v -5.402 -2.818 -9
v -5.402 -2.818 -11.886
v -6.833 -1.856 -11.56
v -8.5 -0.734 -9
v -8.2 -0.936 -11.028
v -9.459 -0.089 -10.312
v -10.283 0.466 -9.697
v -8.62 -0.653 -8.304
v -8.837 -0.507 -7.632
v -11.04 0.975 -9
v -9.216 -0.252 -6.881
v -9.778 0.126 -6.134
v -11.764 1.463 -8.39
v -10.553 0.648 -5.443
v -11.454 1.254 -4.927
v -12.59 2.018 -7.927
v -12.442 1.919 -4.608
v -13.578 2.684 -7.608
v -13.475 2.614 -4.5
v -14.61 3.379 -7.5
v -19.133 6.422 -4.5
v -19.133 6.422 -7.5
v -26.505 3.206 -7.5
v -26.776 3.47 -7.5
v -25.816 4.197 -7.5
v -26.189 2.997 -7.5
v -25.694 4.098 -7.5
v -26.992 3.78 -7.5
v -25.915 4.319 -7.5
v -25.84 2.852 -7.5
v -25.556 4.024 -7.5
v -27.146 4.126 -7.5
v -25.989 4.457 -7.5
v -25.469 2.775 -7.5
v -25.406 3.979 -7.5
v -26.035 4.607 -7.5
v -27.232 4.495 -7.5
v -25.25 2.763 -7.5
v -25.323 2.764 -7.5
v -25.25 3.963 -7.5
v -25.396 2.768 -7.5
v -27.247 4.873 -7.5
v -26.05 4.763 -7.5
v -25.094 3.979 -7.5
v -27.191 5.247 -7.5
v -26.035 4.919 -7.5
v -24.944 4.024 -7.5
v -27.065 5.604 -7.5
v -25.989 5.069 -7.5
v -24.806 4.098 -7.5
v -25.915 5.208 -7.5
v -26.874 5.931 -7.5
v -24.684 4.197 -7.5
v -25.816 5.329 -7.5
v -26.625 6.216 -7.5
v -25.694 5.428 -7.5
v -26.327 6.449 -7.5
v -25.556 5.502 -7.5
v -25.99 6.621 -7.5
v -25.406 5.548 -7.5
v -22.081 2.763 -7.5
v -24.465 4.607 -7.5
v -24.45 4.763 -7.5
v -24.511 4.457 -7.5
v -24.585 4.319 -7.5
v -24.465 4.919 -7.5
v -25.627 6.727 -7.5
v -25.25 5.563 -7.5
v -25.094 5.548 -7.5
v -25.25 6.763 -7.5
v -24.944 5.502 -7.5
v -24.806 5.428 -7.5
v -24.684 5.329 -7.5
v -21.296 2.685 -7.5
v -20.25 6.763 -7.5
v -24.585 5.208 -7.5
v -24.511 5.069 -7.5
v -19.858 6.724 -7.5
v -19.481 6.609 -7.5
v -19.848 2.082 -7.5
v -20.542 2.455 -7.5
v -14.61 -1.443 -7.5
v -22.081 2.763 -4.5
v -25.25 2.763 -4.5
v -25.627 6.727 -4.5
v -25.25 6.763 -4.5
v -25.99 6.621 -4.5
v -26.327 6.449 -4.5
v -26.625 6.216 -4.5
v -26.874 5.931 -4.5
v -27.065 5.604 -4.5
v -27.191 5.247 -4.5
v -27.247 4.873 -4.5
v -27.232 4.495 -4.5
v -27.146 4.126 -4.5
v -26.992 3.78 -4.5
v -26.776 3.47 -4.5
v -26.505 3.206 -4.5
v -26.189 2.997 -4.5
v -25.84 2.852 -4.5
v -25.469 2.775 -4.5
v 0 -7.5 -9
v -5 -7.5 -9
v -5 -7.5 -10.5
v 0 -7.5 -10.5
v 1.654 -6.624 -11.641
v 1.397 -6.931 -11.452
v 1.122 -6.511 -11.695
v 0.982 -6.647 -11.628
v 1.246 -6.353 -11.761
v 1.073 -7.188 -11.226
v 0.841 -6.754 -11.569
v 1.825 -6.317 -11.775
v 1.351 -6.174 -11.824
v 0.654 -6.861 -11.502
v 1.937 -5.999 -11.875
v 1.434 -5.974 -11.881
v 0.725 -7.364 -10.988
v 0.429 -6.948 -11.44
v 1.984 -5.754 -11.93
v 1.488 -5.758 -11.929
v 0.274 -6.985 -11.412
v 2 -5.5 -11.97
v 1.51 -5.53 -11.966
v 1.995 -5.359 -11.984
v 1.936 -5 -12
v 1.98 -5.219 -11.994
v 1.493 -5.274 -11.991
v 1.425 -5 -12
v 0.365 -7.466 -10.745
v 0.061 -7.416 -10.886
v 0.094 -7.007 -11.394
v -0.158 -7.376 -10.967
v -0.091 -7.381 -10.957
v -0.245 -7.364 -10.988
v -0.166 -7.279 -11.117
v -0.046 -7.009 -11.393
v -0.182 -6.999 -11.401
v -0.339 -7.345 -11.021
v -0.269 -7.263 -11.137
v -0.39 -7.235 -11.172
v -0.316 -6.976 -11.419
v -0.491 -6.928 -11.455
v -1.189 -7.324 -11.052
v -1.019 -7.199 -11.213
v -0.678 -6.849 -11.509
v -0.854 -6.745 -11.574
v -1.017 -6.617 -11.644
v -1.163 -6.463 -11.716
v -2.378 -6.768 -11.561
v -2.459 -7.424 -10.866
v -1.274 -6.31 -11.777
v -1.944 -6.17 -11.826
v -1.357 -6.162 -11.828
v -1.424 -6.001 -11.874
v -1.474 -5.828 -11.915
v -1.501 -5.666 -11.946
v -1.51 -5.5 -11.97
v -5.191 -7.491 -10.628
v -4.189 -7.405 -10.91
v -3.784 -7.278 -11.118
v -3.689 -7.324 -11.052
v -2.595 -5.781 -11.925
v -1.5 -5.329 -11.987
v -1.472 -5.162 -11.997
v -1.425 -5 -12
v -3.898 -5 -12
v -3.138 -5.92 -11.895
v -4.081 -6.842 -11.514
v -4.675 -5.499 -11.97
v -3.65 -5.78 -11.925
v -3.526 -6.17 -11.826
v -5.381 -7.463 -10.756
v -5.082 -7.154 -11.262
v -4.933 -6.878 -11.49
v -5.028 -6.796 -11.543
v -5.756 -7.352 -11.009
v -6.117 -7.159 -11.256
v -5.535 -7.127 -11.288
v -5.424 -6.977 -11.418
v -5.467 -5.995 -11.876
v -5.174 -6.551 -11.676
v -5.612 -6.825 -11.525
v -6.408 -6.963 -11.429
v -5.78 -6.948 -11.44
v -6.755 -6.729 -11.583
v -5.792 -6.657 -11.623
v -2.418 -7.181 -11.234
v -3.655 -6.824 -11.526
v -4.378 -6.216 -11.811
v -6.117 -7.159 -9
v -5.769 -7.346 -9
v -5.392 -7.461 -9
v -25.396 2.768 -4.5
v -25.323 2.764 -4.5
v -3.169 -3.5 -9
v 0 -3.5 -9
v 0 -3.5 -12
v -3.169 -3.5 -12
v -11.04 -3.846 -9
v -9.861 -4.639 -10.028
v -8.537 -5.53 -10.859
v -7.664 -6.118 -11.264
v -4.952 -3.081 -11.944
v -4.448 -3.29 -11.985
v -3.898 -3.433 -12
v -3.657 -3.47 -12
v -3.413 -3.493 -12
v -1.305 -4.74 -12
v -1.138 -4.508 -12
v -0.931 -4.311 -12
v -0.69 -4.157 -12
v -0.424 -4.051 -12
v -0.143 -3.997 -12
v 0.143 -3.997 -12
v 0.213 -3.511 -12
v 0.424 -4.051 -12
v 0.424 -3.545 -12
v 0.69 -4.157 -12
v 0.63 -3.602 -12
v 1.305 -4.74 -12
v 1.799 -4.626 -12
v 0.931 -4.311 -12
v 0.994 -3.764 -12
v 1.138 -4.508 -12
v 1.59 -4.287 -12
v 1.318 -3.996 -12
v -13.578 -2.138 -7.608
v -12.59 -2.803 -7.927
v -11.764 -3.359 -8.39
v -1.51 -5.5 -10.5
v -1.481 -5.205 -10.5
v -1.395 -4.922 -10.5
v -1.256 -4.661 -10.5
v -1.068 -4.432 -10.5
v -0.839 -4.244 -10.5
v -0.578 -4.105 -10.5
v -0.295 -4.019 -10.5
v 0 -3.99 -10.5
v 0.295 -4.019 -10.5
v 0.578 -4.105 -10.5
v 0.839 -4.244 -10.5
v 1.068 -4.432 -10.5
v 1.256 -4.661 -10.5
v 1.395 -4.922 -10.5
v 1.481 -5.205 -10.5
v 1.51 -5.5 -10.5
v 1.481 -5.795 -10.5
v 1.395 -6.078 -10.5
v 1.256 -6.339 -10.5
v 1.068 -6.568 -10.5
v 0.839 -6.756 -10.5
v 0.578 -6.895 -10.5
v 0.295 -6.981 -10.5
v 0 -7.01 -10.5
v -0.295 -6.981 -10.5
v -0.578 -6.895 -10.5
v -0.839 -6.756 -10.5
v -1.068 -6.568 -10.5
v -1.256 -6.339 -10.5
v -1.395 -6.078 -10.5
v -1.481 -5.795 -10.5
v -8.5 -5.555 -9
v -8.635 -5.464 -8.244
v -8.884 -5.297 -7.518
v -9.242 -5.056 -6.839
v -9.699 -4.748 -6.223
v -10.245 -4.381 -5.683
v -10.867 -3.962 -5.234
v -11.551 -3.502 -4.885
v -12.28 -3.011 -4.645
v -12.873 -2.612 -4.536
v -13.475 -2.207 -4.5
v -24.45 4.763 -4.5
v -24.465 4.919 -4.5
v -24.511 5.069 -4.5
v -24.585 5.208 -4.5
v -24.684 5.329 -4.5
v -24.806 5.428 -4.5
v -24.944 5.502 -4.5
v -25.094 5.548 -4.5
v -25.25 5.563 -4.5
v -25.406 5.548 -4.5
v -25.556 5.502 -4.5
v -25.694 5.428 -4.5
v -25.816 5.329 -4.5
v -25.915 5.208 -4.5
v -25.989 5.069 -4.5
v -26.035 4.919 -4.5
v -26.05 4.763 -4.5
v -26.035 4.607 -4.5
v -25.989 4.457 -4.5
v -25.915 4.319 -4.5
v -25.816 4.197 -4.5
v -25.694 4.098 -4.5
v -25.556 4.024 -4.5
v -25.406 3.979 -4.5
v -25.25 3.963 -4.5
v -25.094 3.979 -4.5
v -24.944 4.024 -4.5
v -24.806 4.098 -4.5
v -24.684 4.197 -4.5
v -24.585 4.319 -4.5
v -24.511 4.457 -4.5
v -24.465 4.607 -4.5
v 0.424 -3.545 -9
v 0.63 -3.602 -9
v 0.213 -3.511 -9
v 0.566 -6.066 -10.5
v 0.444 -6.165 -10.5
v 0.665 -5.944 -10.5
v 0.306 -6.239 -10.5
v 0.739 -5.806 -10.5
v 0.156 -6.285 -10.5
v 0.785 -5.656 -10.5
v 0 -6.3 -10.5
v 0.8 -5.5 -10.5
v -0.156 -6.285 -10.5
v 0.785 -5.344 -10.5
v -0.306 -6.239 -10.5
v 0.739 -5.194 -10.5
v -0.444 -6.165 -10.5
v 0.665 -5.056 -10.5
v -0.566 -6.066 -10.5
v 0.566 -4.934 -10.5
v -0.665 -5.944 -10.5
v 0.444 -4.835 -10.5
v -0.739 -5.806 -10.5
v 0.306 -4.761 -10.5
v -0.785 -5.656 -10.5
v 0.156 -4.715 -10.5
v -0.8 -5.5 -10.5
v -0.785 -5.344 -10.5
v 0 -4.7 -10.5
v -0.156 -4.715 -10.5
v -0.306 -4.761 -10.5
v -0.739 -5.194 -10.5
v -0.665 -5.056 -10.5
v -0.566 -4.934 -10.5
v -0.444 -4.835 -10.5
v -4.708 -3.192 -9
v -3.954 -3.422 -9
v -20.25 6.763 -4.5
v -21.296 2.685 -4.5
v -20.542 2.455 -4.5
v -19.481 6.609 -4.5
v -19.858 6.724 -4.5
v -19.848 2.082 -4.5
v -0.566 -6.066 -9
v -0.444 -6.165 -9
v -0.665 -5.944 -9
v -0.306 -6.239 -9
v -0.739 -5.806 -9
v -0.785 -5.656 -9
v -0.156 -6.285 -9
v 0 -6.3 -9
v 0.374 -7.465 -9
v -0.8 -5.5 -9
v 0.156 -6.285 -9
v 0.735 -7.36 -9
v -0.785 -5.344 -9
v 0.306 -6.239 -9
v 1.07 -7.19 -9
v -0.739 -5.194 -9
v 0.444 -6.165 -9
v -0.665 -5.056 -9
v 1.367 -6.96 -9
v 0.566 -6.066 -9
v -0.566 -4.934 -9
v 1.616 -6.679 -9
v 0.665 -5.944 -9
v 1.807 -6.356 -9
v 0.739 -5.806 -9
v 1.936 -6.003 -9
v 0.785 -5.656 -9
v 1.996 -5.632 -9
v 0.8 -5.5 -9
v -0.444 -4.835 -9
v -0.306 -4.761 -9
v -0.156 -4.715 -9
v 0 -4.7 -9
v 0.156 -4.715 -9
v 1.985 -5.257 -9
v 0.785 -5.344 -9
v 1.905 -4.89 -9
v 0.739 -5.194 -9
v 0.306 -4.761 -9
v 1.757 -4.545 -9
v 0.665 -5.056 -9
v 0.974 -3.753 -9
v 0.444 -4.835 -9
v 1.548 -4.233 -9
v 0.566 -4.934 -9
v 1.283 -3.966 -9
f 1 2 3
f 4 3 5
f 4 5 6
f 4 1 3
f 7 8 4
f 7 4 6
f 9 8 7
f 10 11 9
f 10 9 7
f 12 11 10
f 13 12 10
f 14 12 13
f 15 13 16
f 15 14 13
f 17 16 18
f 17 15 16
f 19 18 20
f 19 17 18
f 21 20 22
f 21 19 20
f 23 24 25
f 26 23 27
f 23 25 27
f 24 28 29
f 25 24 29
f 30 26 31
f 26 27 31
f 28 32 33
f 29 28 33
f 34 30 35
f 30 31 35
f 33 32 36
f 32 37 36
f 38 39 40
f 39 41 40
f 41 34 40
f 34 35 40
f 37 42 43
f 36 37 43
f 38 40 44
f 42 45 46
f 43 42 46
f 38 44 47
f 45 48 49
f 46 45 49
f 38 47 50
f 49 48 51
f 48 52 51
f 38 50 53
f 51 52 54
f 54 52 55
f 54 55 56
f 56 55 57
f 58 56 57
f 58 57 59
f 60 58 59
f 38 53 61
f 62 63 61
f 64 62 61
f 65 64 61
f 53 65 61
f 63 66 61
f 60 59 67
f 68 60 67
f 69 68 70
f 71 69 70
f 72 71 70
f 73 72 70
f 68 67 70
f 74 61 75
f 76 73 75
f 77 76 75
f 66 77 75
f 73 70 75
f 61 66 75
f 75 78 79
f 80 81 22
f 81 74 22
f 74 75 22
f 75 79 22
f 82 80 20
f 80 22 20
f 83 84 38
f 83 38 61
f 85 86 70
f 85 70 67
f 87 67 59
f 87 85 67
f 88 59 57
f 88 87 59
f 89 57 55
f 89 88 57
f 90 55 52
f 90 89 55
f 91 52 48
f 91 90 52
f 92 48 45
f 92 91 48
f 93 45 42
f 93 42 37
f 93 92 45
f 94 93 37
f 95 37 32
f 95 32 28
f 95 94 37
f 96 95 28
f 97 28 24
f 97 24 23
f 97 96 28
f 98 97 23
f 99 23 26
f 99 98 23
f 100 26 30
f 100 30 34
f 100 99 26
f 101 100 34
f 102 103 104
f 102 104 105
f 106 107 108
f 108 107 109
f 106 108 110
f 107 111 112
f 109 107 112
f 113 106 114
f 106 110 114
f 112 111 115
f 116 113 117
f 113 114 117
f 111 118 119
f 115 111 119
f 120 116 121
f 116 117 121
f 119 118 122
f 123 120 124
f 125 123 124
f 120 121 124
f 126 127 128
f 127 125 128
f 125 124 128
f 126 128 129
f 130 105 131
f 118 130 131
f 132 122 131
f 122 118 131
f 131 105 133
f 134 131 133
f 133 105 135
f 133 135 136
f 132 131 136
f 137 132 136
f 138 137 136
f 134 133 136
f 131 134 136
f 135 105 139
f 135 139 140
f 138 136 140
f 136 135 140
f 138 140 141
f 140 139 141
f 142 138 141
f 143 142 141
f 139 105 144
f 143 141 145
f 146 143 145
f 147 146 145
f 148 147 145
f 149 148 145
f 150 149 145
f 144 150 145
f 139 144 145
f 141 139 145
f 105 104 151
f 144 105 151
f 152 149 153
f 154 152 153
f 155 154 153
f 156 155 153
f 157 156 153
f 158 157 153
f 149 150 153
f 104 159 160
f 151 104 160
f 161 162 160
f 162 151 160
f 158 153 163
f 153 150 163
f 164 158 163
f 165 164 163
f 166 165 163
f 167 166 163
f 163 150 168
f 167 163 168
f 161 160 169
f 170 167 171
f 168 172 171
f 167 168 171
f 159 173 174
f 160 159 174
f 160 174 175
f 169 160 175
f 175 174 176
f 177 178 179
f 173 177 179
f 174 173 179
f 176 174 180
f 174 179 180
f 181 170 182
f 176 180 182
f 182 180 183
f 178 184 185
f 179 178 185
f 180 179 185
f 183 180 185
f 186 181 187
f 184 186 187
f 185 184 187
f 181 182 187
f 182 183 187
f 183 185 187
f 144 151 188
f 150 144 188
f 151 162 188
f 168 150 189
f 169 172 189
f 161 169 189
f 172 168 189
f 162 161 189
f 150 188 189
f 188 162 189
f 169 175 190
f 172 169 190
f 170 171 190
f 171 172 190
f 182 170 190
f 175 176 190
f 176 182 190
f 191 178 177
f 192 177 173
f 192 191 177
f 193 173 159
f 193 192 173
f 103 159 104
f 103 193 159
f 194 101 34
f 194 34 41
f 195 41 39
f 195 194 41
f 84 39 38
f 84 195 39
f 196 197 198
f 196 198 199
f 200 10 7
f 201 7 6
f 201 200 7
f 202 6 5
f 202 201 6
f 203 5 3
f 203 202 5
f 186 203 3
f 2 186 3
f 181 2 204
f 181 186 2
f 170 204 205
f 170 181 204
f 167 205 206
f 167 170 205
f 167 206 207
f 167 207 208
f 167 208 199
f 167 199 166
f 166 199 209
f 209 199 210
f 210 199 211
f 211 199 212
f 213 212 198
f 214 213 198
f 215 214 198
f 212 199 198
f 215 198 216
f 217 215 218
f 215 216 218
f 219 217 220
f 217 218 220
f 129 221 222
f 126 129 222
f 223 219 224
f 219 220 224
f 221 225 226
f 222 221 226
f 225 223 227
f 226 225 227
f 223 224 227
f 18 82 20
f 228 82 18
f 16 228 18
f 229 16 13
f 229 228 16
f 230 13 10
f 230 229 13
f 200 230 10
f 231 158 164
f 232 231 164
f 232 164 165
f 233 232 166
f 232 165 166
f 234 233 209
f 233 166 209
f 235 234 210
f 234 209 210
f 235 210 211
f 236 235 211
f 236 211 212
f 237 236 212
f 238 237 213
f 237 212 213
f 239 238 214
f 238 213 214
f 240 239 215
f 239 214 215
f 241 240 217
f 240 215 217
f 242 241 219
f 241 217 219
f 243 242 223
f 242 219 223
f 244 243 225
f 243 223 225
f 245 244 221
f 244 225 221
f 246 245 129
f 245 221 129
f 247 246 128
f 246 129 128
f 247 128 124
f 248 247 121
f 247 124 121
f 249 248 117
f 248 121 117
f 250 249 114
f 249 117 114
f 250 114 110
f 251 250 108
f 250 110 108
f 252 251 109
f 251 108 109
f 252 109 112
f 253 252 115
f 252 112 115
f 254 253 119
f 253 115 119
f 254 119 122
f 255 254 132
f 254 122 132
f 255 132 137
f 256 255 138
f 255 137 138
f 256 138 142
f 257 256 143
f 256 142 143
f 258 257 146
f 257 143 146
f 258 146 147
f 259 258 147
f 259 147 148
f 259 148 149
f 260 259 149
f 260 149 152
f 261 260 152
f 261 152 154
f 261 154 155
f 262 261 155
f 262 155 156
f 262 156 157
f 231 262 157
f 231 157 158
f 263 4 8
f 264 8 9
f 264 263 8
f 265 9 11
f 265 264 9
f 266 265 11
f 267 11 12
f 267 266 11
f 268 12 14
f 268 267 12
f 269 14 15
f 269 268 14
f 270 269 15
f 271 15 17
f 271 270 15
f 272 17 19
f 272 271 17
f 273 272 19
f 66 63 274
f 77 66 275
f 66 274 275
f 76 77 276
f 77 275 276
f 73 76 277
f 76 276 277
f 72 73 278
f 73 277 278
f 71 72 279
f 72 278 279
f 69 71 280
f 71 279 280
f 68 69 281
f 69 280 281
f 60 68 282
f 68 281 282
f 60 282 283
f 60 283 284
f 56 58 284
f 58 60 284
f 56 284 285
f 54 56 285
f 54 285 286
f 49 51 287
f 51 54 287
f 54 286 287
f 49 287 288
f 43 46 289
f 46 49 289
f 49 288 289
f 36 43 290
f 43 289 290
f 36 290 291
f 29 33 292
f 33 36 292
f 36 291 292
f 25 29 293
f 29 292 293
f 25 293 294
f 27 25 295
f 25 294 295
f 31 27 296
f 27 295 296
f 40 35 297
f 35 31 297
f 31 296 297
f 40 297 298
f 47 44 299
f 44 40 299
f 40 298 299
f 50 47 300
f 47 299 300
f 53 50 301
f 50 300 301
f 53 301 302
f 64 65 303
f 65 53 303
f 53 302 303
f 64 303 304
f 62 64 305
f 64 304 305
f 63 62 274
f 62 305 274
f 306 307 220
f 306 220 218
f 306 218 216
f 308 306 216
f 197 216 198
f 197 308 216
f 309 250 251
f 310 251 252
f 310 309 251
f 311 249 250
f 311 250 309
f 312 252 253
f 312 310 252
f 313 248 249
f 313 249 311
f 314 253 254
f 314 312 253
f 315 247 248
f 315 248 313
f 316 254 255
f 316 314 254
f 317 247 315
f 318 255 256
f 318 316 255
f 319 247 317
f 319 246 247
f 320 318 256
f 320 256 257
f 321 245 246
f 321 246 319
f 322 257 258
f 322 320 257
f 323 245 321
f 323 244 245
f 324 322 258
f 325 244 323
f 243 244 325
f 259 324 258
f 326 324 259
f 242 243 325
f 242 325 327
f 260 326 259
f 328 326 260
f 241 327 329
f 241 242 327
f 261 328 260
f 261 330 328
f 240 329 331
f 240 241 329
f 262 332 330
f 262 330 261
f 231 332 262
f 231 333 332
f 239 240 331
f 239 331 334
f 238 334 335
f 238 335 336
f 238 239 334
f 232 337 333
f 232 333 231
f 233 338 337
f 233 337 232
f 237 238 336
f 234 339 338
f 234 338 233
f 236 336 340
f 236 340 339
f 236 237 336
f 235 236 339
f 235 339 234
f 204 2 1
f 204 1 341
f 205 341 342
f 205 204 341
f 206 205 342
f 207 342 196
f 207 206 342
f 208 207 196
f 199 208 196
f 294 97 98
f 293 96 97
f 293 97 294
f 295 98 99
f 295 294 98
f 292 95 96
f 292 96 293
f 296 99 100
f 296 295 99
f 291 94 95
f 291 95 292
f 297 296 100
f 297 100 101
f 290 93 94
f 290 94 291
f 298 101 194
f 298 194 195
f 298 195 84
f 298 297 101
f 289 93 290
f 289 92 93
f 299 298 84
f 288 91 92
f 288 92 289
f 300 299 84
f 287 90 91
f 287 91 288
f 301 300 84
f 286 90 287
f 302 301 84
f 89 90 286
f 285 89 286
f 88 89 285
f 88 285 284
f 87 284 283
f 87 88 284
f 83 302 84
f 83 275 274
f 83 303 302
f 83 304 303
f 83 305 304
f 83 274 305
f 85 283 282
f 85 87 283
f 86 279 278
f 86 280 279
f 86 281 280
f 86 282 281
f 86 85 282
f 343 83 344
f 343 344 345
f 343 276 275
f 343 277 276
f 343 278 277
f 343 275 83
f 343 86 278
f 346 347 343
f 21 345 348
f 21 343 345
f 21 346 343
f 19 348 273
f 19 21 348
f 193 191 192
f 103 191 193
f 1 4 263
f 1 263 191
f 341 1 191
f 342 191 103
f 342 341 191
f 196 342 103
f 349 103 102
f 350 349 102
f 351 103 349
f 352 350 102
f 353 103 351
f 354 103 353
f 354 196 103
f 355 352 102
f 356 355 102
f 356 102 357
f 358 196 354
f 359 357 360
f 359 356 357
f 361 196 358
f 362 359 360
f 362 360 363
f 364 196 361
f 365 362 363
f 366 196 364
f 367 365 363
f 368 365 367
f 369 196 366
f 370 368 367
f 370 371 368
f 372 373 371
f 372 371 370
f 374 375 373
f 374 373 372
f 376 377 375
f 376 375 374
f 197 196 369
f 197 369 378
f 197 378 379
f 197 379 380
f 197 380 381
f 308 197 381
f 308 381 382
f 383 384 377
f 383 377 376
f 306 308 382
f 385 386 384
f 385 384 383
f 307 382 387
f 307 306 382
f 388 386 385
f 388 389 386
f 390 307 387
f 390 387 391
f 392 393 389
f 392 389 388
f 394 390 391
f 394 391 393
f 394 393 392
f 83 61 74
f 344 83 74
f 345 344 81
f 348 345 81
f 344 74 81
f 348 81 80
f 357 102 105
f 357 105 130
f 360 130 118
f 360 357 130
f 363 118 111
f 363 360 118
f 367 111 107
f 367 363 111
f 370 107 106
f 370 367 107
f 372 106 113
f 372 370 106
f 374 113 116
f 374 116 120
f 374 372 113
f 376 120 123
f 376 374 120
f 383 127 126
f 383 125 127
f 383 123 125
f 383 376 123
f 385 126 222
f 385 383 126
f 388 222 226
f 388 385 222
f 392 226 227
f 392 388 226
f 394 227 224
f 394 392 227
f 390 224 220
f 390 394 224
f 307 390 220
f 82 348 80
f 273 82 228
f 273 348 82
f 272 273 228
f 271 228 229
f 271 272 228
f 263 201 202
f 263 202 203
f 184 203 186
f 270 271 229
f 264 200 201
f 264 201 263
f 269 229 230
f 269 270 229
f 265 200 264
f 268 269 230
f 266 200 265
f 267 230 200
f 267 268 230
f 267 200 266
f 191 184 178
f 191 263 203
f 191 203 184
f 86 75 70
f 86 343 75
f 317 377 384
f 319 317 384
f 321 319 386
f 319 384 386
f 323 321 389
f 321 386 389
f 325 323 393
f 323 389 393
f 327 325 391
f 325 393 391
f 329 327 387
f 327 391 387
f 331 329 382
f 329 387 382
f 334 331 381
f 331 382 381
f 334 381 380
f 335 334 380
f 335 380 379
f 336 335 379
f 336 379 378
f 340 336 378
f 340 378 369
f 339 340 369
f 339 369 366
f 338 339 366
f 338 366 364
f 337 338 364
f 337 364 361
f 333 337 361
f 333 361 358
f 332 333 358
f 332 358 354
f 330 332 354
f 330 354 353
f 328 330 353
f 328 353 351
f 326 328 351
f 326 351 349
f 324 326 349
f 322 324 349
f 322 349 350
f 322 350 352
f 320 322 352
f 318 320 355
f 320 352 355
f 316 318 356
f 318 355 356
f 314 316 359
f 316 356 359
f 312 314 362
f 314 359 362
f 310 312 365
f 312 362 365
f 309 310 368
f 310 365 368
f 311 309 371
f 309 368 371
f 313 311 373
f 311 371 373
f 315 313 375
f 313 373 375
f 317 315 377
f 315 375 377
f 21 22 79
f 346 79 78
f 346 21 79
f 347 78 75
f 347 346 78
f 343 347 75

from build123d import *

# Parameters (mm, degrees)
BOSS_EXTRUDE1_START = -4.5
SKETCH1_R           = 0.8
BOSS_EXTRUDE1_DEPTH = 7.5
FILLET1_R           = 4
SKETCH4_W           = 10.5
SKETCH4_H           = 4.5
CUT_EXTRUDE2_DEPTH  = 29.619267985
SKETCH5_W           = 15
SKETCH5_H           = 4.5
CUT_EXTRUDE3_DEPTH  = 29.619267985
FILLET2_R           = 10
FILLET3_R           = 5
FILLET4_R           = 5
SKETCH7_W           = 29.25
SKETCH7_H           = 14.263139721
CUT_EXTRUDE4_DEPTH  = 7.5
CUT_EXTRUDE5_START  = -6.755354819
CUT_EXTRUDE5_DEPTH  = 8.755354819
SKETCH10_R          = 1.51
CUT_EXTRUDE6_DEPTH  = 1.5


# Read off the part's stored shape, not the designer's step: Mirror5, Cut-Extrude5
with BuildPart() as part:
    # Sketch1 → Boss-Extrude1 (new body)
    with BuildSketch(Plane.XY.offset(BOSS_EXTRUDE1_START)):
        with BuildLine():
            Line((-4.389678411, -3.5), (-19.133343362, 6.422379894))
            ThreePointArc((-19.133343362, 6.422379894), (-19.666253628, 6.676053774), (-20.25, 6.763139721))
            Line((-20.25, 6.763139721), (-25.25, 6.763139721))
            ThreePointArc((-25.25, 6.763139721), (-27.246991207, 4.872803379), (-25.468997361, 2.775165839))
            ThreePointArc((-25.468997361, 2.775165839), (-25.359663658, 2.766148514), (-25.25, 2.763139721))
            Line((-25.25, 2.763139721), (-20.860321589, 2.763139721))
            Line((-20.860321589, 2.763139721), (-6.116656638, -7.159240173))
            ThreePointArc((-6.116656638, -7.159240173), (-5.583746372, -7.412914053), (-5, -7.5))
            Line((-5, -7.5), (0, -7.5))
            ThreePointArc((0, -7.5), (1.974370247, -5.81915847), (0.630136986, -3.601862129))
            ThreePointArc((0.630136986, -3.601862129), (0.31915847, -3.525629753), (0, -3.5))
            Line((0, -3.5), (-4.389678411, -3.5))
        make_face()
        with Locations((0, -5.5)):
            Circle(SKETCH1_R, mode=Mode.SUBTRACT)
        with Locations((-25.25, 4.763139721)):
            Circle(SKETCH1_R, mode=Mode.SUBTRACT)
    extrude(amount=BOSS_EXTRUDE1_DEPTH)

    # Fillet1
    fillet1_edges = [part.edges().sort_by_distance(p)[0] for p in [
        (-4.389678411, -3.5, -0.75),
        (-20.860321589, 2.763139721, -0.75),
    ]]
    fillet(fillet1_edges, radius=FILLET1_R)

    # Sketch4 → Cut-Extrude2 (cut, symmetric)
    with BuildSketch(Plane(origin=(0, 0, 0), x_dir=(1, 0, 0), z_dir=(0, 1, 0))):
        with Locations((-3.25, 2.25)):
            Rectangle(SKETCH4_W, SKETCH4_H)
    extrude(amount=CUT_EXTRUDE2_DEPTH, both=True, mode=Mode.SUBTRACT)

    # Sketch5 → Cut-Extrude3 (cut, symmetric)
    with BuildSketch(Plane(origin=(0, 0, 0), x_dir=(1, 0, 0), z_dir=(0, 1, 0))):
        with Locations((-19.75, -0.75)):
            Rectangle(SKETCH5_W, SKETCH5_H)
    extrude(amount=CUT_EXTRUDE3_DEPTH, both=True, mode=Mode.SUBTRACT)

    # Fillet2
    # the kernel refuses this fillet: 10 mm, written as the material it takes off along each edge
    with BuildSketch(Plane(origin=(-12.25, -23.910660804, 3), x_dir=(1.537930276954748e-12, 0, -1.0), z_dir=(0, 1, 0))) as fillet2_piece_1:
        with BuildLine():
            CenterArc((10, -8.351646544), FILLET2_R, 123.367012969, 56.632987031)
            Line((0, -8.351646544), (-0.2, -8.351646544))
            Line((-0.2, -8.351646544), (-0.2, 0))
            Line((-0.2, 0), (0, 0.2))
            ThreePointArc((0, 0.2), (2.25, 0.2), (4.39, 0.167032931))
            Line((4.39, 0.167032931), (4.5, 0))
        make_face()
    extrude(amount=46.579716753, mode=Mode.SUBTRACT)

    # Fillet3
    # the kernel refuses this fillet: 5 mm, written as the material it takes off along each edge
    with BuildSketch(Plane(origin=(-8.5, -17.99261029, -4.5), x_dir=(0, 0, 1), z_dir=(0, 1, 0))) as fillet3_piece_1:
        with BuildLine():
            CenterArc((5, -4.974937186), FILLET3_R, 95.739170477, 84.260829523)
            Line((0, -4.974937186), (-0.1, -4.974937186))
            Line((-0.1, -4.974937186), (-0.1, 0))
            Line((-0.1, 0), (0, 0.1))
            ThreePointArc((0, 0.1), (2.25, 0.1), (4.49, 0.099498744))
            Line((4.49, 0.099498744), (4.5, 0))
        make_face()
    extrude(amount=29.696169959, mode=Mode.SUBTRACT)

    # Fillet4
    fillet4_edges = [part.edges().sort_by_distance(p)[0] for p in [
        (-12.25, -0.620802428, -1.5),
    ]]
    fillet(fillet4_edges, radius=FILLET4_R)

    # Mirror5: part across plane


with BuildPart() as part_1:
    add(part.part)
    add(part.part.mirror(Plane.XY.offset(-4.5)))

    # Sketch7 → Cut-Extrude4 (cut)
    with BuildSketch(Plane.XY.offset(3)):
        with Locations((-12.625, -0.36843014)):
            Rectangle(SKETCH7_W, SKETCH7_H)
    extrude(amount=-CUT_EXTRUDE4_DEPTH, mode=Mode.SUBTRACT)

    # Cut-Extrude5 outline → Cut-Extrude5 (cut)
    with BuildSketch(Plane(origin=(0, 0, 0), x_dir=(0, 0, -1), z_dir=(1, 0, 0)).offset(CUT_EXTRUDE5_START)):
        with BuildLine():
            add(Edge.make_bspline(
                [(10.5, -7.5), (12, -7.5), (12, -5)],
                knots=[0, 0, 0, 1.570796327, 1.570796327, 1.570796327], degree=2, weights=[1, 0.707106781, 1]))
            Line((10.5, -7.5), (12, -7.5))
            Line((12, -7.5), (12, -5))
        make_face()
    extrude(amount=CUT_EXTRUDE5_DEPTH, mode=Mode.SUBTRACT)

    # Sketch10 → Cut-Extrude6 (cut)
    with BuildSketch(Plane(origin=(0, 0, -12), x_dir=(-1, 0, 0), z_dir=(0, 0, -1))):
        with Locations((0, -5.5)):
            Circle(SKETCH10_R)
    extrude(amount=-CUT_EXTRUDE6_DEPTH, mode=Mode.SUBTRACT)


solid = part_1.part
